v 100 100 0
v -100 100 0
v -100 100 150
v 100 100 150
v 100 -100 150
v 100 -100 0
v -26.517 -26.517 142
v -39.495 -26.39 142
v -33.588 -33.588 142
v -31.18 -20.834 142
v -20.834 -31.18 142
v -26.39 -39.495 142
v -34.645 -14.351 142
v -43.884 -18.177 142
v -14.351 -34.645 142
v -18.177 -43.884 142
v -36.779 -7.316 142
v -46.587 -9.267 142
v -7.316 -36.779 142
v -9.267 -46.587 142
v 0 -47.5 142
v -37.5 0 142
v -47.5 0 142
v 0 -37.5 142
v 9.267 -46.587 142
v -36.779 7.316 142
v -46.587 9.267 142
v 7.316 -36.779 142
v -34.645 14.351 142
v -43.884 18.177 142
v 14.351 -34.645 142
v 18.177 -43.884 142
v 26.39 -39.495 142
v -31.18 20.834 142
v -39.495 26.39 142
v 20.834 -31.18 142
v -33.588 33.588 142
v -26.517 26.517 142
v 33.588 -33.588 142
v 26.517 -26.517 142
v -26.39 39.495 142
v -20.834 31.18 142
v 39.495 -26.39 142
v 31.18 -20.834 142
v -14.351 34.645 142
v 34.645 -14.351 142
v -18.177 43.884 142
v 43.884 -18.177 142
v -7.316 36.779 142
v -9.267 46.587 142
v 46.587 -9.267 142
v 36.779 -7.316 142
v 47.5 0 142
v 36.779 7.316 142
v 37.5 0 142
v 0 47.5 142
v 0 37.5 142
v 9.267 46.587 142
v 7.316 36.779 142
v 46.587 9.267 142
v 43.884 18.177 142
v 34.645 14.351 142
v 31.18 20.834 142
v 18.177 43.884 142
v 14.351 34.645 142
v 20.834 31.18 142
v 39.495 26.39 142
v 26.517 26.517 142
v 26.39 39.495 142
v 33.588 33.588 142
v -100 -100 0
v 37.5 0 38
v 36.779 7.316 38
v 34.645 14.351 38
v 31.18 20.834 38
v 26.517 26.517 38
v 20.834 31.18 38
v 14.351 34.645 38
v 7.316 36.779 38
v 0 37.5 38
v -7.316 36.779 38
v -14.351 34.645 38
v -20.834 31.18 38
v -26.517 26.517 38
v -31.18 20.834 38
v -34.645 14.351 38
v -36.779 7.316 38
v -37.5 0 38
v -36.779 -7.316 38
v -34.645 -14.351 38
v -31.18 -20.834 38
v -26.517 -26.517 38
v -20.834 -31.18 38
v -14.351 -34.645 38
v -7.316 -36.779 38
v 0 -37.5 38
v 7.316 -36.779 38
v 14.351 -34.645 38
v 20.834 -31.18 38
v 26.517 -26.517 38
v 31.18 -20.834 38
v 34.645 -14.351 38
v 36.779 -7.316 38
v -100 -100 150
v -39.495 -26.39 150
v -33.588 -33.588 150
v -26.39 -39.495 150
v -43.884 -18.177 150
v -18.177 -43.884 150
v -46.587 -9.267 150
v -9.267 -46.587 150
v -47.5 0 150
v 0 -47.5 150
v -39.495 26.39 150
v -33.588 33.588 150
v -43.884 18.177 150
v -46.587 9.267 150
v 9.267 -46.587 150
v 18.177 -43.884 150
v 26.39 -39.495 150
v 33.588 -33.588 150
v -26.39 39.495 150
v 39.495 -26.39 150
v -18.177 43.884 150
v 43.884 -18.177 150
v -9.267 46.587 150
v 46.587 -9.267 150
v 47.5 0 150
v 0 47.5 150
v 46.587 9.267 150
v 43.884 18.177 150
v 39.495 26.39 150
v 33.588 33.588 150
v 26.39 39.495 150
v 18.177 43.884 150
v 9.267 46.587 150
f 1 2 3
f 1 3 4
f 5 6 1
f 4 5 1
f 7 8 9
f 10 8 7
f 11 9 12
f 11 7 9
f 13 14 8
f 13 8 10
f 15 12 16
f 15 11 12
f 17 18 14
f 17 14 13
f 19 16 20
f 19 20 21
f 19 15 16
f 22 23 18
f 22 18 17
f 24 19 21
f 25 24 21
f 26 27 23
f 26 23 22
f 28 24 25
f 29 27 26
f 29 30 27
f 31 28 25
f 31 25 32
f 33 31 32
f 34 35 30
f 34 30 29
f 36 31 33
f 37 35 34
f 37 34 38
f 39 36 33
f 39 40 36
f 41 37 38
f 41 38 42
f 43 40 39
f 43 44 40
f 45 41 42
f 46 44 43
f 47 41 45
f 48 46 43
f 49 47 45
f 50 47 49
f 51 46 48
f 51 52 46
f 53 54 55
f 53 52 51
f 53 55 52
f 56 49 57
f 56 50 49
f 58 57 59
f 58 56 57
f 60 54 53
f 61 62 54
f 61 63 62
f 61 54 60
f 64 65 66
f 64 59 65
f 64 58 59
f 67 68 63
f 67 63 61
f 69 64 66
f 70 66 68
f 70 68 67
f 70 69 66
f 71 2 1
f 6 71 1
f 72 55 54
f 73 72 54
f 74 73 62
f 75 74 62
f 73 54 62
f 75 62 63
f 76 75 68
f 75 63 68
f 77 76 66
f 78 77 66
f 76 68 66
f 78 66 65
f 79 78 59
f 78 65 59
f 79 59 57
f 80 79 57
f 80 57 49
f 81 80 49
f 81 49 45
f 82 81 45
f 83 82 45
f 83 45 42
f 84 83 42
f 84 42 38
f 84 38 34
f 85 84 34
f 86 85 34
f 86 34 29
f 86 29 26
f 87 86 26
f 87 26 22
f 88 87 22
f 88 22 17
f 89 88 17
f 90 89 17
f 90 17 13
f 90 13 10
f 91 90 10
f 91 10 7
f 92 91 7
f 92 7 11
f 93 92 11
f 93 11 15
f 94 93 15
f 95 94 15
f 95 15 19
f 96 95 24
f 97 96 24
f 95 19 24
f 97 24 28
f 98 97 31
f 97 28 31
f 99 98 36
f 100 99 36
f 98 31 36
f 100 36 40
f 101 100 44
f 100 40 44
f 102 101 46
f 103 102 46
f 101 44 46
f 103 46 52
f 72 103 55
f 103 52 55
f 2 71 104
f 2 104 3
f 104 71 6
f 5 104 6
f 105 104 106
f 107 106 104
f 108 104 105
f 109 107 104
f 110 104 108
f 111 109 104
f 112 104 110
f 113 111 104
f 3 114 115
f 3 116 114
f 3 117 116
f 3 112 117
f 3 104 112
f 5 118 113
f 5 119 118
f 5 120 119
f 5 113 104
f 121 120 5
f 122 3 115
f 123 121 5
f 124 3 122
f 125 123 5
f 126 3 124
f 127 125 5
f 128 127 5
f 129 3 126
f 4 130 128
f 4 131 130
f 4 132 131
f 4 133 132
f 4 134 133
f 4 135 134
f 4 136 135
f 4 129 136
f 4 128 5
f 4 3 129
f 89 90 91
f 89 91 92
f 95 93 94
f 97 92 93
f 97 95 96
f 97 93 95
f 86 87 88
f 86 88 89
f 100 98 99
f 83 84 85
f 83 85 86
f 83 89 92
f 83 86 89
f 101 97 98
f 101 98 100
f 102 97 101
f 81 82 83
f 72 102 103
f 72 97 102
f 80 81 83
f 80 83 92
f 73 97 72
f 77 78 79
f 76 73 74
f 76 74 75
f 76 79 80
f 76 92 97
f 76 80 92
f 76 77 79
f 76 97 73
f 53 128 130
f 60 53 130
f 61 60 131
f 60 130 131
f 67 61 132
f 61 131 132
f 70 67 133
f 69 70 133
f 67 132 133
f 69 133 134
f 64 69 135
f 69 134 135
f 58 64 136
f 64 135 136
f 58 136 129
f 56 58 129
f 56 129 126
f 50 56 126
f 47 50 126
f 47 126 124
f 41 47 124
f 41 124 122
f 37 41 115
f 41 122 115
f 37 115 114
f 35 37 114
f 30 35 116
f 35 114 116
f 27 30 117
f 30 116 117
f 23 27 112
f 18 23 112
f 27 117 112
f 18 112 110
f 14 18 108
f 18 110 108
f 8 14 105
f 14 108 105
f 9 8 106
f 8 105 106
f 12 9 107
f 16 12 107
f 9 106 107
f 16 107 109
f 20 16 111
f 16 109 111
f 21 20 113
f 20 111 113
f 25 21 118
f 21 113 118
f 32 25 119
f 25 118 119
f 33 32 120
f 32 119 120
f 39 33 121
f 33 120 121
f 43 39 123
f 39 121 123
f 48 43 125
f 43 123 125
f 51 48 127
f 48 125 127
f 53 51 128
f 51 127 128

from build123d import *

# Parameters (mm, degrees)
F0_W     = 200
F0_H     = 200
F1_DEPTH = 150
F2_R     = 37.5
F3_DEPTH = 112
F4_R     = 47.5
F5_DEPTH = 8


with BuildPart() as f1:
    # F0 (on Top) → F1 (new body)
    with BuildSketch(Plane.XY):
        Rectangle(F0_W, F0_H)
    extrude(amount=F1_DEPTH)

    # F2 (on face) → F3 (cut)
    with BuildSketch(Plane.XY.offset(150)):
        Circle(F2_R)
    extrude(amount=-F3_DEPTH, mode=Mode.SUBTRACT)

    # F4 (on face) → F5 (cut)
    with BuildSketch(Plane.XY.offset(150)):
        Circle(F4_R)
    extrude(amount=-F5_DEPTH, mode=Mode.SUBTRACT)


solid = f1.part
